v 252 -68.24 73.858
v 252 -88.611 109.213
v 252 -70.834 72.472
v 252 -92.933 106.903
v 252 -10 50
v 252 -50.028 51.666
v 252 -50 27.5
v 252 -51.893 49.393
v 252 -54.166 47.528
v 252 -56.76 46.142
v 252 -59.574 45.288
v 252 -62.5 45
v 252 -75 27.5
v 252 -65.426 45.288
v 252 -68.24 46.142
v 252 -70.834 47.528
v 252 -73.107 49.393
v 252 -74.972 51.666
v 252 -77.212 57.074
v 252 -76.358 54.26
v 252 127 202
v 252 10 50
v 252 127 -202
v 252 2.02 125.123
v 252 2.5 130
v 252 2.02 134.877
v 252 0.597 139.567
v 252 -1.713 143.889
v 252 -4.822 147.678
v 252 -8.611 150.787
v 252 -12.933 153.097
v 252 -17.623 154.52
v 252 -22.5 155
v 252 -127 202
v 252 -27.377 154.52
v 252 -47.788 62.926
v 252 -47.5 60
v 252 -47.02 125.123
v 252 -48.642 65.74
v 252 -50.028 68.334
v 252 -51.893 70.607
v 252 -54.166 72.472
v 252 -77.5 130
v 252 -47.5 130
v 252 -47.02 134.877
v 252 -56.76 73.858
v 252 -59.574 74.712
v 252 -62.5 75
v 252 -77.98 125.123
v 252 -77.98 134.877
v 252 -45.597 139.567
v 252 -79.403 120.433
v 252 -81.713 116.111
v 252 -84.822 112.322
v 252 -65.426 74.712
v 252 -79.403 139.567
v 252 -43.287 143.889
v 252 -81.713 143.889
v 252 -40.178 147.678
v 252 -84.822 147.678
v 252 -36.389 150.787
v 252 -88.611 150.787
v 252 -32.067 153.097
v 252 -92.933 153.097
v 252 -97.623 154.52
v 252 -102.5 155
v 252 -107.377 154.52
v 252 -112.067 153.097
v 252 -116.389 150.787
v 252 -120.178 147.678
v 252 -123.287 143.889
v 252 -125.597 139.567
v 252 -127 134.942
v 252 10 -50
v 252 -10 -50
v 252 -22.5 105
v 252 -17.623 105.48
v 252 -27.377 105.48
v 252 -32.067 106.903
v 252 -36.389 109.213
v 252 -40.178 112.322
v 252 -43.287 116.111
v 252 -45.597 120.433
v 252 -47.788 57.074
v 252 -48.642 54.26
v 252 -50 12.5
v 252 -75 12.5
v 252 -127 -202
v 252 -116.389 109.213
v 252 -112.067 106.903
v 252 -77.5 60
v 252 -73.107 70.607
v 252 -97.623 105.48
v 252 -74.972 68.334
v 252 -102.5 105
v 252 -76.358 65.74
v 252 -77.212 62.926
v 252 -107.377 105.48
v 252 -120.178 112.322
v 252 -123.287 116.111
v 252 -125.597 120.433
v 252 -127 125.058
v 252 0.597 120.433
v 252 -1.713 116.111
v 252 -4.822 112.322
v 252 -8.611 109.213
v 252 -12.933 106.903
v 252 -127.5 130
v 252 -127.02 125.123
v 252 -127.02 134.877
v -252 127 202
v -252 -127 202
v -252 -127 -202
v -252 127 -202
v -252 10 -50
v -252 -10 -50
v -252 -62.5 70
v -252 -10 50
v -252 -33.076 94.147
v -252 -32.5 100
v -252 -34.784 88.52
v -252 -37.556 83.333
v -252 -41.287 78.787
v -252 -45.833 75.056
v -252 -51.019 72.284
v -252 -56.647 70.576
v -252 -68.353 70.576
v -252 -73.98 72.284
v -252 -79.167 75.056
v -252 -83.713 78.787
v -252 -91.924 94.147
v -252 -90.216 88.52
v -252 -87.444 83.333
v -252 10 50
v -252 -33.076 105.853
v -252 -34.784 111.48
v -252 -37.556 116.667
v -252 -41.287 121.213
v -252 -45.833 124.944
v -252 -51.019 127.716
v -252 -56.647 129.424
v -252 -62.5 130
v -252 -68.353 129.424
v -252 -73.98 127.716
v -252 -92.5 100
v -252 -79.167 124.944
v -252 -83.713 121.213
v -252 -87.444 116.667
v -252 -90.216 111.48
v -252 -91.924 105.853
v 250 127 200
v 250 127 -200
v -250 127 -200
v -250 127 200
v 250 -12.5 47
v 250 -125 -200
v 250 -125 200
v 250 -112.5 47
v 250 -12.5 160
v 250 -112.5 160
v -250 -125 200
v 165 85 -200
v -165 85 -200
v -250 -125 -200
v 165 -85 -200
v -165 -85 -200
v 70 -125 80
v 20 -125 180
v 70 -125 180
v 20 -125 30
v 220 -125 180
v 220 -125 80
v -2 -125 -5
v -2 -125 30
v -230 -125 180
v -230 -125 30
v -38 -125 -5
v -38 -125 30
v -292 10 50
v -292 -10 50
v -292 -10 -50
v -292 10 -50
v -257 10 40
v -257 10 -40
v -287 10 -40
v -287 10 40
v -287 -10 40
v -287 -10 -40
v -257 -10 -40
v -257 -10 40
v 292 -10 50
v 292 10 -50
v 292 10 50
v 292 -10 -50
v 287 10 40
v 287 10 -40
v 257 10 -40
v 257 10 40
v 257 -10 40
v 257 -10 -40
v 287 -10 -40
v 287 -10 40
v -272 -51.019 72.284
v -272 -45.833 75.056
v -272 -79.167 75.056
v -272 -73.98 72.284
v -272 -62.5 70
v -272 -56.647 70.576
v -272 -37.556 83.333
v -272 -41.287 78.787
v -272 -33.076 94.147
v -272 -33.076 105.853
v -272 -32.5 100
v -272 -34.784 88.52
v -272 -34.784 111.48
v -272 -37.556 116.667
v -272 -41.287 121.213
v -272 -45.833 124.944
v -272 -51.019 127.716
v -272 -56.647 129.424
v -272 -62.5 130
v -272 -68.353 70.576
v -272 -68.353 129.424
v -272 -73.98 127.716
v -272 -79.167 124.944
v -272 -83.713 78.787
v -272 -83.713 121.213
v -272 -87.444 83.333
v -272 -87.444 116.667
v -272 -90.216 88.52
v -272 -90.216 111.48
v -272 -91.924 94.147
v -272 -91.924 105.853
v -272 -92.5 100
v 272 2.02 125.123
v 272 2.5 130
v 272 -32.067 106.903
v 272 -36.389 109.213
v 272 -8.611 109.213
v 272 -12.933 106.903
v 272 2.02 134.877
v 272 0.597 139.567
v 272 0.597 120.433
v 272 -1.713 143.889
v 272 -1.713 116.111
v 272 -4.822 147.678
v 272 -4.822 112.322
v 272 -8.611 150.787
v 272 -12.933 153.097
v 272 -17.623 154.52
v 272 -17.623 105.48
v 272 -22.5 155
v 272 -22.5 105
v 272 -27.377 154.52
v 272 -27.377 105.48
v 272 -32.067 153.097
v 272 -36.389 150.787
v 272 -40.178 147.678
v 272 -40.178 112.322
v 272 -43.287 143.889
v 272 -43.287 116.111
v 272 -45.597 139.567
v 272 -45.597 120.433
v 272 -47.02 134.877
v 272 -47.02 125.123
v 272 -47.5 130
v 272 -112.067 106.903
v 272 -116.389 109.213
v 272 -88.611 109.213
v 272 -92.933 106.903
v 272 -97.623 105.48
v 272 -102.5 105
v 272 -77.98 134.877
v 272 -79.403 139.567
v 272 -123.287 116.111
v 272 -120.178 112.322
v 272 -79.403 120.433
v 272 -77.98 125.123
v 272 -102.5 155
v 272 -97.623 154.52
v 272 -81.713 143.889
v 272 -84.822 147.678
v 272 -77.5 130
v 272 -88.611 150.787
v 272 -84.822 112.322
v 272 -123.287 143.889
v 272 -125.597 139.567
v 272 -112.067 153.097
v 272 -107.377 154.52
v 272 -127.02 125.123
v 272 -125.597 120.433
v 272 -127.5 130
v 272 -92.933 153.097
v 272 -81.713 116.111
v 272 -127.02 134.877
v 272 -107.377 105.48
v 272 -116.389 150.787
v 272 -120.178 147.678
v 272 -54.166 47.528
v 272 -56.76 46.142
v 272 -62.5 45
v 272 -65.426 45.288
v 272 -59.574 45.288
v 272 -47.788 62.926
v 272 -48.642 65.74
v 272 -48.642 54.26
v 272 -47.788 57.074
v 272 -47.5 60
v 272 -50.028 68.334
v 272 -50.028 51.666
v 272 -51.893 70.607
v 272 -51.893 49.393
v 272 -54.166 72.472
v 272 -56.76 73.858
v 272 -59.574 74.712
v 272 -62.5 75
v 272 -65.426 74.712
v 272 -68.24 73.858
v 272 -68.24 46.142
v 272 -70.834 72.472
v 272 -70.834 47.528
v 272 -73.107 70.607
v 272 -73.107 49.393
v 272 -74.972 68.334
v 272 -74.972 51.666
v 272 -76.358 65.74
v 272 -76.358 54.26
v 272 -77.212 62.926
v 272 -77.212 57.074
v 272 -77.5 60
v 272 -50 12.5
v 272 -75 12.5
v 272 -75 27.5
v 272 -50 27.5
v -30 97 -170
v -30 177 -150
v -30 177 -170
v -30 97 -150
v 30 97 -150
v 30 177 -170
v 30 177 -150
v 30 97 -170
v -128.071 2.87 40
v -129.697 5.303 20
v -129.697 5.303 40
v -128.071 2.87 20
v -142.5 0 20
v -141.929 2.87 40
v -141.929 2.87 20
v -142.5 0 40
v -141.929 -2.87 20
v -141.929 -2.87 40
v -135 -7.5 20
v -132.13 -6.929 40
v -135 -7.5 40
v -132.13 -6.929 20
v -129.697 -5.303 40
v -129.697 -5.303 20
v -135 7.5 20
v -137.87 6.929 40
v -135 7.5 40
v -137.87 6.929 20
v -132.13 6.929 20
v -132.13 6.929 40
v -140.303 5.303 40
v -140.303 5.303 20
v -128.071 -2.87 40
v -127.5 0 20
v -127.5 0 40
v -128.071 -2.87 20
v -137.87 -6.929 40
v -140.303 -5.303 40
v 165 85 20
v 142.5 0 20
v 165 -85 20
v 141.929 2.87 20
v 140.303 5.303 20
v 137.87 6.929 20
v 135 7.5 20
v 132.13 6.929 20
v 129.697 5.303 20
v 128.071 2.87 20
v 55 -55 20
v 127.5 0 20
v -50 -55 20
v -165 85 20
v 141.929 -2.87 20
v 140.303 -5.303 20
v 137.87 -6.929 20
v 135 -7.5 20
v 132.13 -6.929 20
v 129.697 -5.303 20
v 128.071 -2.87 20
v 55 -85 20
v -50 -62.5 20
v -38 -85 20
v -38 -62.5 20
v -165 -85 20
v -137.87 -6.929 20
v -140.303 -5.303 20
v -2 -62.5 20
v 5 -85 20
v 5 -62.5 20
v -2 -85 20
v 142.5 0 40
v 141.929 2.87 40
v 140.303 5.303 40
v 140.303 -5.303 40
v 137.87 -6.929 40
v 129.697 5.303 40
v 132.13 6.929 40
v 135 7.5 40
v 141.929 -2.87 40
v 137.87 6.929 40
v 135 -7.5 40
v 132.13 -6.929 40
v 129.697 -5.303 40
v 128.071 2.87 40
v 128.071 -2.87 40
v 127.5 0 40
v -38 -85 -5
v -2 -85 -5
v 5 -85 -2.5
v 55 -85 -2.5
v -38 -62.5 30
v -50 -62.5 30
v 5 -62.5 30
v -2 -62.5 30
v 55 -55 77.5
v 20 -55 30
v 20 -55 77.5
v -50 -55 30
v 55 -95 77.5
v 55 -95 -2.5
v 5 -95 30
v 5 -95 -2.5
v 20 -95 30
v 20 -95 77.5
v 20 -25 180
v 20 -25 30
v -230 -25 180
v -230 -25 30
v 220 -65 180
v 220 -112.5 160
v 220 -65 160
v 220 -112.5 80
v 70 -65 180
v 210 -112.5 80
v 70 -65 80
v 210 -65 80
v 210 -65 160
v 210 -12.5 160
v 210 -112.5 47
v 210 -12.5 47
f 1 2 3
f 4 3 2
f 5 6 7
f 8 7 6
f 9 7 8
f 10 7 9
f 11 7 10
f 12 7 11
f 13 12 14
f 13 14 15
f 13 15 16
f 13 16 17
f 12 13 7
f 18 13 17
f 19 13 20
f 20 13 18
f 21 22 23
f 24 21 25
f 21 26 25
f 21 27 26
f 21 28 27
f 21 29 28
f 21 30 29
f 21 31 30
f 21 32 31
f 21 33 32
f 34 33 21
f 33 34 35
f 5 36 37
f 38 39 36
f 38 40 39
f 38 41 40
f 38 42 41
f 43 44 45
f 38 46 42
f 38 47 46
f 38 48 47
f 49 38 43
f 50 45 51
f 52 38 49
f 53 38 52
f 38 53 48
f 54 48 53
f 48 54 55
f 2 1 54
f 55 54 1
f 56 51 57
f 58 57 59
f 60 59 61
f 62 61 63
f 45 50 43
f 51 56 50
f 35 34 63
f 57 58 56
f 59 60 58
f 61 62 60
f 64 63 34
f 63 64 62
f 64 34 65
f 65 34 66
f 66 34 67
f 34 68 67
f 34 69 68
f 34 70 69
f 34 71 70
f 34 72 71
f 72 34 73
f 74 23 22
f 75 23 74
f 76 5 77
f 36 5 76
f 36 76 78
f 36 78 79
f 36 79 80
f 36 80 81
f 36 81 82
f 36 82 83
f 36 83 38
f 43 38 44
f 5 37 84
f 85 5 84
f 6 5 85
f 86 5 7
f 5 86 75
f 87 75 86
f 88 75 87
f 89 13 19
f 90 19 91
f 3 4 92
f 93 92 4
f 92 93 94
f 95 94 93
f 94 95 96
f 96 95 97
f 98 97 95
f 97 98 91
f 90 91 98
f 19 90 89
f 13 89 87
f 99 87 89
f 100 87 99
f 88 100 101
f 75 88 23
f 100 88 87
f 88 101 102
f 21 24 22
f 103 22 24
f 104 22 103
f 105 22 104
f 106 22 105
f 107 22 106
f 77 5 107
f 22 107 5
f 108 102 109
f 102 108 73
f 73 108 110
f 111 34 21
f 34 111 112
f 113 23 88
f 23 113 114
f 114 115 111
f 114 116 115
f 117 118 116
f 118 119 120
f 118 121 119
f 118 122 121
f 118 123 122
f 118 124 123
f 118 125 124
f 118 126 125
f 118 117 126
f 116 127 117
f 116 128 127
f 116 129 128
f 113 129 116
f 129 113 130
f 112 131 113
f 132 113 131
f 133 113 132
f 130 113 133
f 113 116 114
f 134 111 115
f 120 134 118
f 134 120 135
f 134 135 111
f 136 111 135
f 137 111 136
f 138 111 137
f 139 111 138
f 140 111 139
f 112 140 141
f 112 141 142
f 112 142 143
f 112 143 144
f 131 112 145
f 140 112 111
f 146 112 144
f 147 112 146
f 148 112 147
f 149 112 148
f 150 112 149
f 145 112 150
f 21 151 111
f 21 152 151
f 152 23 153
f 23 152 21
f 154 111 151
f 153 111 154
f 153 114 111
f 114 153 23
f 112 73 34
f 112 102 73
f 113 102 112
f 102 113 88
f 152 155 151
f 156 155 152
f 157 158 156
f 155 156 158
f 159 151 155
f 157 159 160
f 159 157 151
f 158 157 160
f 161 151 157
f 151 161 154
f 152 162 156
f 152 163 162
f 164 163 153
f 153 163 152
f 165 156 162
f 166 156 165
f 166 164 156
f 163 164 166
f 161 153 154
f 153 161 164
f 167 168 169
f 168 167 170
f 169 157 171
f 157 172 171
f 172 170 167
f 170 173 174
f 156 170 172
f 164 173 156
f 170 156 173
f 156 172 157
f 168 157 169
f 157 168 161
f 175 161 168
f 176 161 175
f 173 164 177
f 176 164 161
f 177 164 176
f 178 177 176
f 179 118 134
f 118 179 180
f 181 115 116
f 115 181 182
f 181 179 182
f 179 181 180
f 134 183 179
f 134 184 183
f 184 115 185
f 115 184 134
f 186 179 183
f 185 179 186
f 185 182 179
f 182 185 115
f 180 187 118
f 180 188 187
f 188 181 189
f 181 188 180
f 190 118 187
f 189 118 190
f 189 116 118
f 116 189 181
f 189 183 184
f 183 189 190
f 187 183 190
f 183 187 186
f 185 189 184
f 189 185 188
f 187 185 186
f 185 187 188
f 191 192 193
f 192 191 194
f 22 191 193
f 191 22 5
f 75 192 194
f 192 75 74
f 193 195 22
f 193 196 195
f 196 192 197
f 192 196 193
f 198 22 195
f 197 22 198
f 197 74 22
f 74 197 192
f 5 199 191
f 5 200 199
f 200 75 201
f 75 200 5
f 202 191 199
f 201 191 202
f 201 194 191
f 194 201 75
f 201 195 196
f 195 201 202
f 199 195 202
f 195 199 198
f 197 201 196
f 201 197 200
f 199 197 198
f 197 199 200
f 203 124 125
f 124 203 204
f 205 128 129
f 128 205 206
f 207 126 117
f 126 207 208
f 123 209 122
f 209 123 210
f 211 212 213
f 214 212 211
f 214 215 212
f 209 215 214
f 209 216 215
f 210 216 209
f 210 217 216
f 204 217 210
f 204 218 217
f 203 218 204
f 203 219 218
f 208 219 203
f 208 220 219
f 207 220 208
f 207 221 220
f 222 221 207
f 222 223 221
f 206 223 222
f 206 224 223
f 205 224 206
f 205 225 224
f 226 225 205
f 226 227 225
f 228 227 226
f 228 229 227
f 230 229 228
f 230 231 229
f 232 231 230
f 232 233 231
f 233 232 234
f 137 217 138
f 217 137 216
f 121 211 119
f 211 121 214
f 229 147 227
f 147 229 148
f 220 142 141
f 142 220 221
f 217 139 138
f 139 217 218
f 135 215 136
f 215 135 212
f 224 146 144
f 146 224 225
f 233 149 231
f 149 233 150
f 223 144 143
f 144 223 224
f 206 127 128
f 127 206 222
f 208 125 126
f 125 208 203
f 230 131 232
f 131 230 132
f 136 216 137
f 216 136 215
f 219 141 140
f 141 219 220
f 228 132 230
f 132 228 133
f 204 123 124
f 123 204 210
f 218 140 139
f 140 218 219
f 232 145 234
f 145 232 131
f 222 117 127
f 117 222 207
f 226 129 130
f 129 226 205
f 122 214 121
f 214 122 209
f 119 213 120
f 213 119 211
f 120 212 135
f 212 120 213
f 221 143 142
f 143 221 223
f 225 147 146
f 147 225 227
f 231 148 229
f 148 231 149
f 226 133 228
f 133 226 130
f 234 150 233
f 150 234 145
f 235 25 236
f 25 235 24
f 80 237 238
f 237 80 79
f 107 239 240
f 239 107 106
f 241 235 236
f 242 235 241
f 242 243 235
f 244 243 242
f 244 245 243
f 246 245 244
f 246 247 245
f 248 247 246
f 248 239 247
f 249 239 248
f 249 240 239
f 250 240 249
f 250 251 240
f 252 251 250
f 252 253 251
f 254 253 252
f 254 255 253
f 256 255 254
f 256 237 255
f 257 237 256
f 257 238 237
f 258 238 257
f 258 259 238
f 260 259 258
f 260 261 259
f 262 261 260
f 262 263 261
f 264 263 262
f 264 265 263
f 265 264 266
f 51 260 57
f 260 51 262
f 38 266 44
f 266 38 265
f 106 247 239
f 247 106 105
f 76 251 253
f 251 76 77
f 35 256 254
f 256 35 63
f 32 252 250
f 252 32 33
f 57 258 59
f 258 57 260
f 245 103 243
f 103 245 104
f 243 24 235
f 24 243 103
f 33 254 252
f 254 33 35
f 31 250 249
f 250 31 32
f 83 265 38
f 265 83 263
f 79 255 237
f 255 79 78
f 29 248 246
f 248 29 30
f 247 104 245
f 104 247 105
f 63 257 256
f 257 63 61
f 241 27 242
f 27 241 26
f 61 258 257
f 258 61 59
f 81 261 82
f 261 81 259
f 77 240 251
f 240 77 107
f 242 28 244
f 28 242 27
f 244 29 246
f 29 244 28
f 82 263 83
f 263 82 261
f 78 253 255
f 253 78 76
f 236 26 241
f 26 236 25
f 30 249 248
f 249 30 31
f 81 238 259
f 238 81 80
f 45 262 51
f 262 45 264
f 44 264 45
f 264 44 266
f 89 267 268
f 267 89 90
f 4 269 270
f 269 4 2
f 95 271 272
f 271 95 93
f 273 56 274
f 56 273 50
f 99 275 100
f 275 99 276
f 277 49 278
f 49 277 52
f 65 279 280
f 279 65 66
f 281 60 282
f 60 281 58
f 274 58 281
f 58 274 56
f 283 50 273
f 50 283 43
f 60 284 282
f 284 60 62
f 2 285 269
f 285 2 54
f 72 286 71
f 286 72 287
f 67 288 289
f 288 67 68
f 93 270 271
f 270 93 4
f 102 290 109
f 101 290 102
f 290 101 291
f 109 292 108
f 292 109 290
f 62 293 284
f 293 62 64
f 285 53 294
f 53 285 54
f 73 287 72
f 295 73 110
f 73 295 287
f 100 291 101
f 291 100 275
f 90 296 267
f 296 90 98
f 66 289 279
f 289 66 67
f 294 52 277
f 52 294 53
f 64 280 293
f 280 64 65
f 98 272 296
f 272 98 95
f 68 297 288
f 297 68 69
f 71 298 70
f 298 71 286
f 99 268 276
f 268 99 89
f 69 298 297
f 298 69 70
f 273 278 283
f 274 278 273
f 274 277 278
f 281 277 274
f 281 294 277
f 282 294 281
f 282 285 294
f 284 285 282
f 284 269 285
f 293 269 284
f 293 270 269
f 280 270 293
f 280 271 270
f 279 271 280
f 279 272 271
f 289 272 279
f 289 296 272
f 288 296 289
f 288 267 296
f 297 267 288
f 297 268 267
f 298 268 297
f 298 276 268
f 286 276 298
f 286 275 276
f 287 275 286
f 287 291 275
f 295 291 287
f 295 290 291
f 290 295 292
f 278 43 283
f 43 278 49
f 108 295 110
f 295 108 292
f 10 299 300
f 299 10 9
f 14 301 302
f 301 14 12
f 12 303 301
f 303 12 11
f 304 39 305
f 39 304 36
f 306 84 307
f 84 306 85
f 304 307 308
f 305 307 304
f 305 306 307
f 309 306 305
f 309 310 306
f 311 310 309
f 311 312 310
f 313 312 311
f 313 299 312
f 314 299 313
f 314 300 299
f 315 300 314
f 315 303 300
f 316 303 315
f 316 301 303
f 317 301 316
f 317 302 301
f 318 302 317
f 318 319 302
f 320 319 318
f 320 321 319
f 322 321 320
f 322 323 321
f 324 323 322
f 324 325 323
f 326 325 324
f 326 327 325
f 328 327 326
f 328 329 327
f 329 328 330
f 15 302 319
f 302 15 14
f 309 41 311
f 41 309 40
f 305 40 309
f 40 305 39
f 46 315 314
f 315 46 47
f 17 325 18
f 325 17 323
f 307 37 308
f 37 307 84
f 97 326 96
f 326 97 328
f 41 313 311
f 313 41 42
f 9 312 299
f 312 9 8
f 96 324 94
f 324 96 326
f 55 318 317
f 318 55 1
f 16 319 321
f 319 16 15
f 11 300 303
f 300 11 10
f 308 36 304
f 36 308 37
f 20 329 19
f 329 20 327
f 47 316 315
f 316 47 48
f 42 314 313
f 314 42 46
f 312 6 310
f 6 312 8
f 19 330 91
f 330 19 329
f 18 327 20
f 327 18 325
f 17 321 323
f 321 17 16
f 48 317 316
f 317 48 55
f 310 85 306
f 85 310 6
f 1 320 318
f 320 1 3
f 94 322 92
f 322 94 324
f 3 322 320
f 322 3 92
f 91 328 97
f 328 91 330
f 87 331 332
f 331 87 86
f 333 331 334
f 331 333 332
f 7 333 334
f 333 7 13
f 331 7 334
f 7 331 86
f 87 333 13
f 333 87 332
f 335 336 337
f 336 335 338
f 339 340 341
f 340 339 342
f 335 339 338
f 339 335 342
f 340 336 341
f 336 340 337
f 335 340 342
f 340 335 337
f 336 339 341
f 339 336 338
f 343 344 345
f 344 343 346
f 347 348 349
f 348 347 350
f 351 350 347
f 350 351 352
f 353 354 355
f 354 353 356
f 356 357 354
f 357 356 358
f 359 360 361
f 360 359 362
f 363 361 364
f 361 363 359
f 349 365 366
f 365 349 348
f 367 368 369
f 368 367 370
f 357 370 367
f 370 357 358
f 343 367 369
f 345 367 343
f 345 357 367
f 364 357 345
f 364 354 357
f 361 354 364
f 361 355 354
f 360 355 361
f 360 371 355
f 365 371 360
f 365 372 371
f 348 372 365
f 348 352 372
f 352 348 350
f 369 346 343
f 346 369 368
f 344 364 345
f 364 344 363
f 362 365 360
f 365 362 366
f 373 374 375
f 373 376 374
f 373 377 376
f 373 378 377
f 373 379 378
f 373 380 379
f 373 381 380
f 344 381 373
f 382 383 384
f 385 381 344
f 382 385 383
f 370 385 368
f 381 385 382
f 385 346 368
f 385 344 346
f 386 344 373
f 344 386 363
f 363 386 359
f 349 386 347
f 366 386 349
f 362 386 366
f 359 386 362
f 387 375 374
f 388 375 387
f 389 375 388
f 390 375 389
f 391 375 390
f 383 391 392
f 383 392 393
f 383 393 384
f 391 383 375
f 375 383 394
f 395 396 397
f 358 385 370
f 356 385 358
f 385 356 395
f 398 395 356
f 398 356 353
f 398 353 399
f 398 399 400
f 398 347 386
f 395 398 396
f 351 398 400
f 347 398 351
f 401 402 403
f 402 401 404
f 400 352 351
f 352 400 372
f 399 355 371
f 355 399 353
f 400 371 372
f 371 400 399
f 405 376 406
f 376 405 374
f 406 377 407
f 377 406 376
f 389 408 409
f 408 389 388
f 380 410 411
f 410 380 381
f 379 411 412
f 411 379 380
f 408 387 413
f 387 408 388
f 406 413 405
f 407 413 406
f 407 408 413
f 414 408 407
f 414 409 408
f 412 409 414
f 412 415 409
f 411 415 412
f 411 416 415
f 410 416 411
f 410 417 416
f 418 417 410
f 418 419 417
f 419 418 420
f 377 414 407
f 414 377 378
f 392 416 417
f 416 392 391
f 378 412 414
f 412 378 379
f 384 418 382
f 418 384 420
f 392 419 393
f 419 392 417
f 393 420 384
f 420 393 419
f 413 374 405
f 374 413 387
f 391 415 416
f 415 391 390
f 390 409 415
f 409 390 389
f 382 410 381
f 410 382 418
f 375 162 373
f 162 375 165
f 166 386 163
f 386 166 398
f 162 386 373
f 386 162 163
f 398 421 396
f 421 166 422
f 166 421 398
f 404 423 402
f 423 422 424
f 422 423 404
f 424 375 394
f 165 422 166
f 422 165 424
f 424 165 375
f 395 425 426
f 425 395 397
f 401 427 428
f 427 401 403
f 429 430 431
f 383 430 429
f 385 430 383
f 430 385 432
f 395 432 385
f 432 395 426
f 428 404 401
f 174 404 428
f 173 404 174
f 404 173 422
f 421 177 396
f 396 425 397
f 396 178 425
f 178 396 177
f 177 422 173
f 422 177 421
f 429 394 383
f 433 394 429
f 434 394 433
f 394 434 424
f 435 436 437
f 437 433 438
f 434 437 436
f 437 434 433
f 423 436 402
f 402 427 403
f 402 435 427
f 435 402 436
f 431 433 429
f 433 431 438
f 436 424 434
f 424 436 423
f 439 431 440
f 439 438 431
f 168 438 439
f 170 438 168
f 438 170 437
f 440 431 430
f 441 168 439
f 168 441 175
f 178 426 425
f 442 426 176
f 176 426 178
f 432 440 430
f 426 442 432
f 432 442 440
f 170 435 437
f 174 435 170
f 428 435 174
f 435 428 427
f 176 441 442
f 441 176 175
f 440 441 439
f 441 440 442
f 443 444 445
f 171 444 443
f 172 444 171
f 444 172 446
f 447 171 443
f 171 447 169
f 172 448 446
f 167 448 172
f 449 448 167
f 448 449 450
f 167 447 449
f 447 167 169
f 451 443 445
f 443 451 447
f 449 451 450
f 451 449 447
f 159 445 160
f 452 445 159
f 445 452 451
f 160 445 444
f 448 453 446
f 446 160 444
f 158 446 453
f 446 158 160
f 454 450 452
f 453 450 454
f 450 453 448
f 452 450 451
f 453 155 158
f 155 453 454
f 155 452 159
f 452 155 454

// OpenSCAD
// Battery Compartment Layout

// --- Parameters ---
// Box dimensions (Internal)
box_w = 500;
box_h = 400;
box_d = 250;
box_thickness = 2;

// Battery dimensions (e.g., typical 12V 100Ah LiFePO4)
batt_w = 330;
batt_d = 170;
batt_h = 220;

// Inverter dimensions (e.g., 1000W)
inv_w = 250;
inv_h = 150;
inv_d = 100;

// Charger dimensions (e.g., 15A AC-DC)
charger_w = 150;
charger_h = 100;
charger_d = 60;

// MPPT Solar Controller dimensions (e.g., Victron SmartSolar 75/15)
mppt_w = 100;
mppt_h = 113;
mppt_d = 40;

// Safety components dimensions
din_rail_w = 100;
din_rail_h = 35;
din_rail_d = 7.5;
rcbo_w = 36; // 2-module wide RCBO
rcbo_h = 85;
rcbo_d = 70;
dc_breaker_w = 50;
dc_breaker_h = 80;
dc_breaker_d = 40;

// --- Modules ---

module enclosure() {
    // Metal electrical box
    difference() {
        // Outer dimensions
        color("SlateGray", 0.3)
        cube([box_w + box_thickness*2, box_d + box_thickness*2, box_h + box_thickness*2], center=true);
        
        // Inner dimensions (hollow out)
        cube([box_w, box_d, box_h], center=true);
        
        // Front door opening
        translate([0, box_d/2, 0])
        cube([box_w, box_thickness*3, box_h], center=true);
    }
}

module handles() {
    // Simple side handles for portability
    handle_w = 20;
    handle_h = 100;
    handle_d = 40;
    
    color("Silver") {
        // Left handle
        translate([-(box_w/2 + handle_d/2 + box_thickness), 0, 0])
        difference() {
            cube([handle_d, handle_w, handle_h], center=true);
            cube([handle_d - 10, handle_w + 2, handle_h - 20], center=true);
        }
        
        // Right handle
        translate([(box_w/2 + handle_d/2 + box_thickness), 0, 0])
        difference() {
            cube([handle_d, handle_w, handle_h], center=true);
            cube([handle_d - 10, handle_w + 2, handle_h - 20], center=true);
        }
    }
}

module external_connectors() {
    // 230V CEE Inlet (Blue, 3-pin)
    color("Blue")
    translate([-(box_w/2 + box_thickness + 10), -box_d/4, box_h/4])
    rotate([0, 90, 0])
    cylinder(d=60, h=20, $fn=32, center=true);
    
    // 2x 230V Outlets (Schuko/Waterproof)
    color("LightGray")
    translate([box_w/2 + box_thickness + 10, -box_d/4 + 40, box_h/4 + 30])
    rotate([0, 90, 0])
    cylinder(d=50, h=20, $fn=32, center=true);
    
    color("LightGray")
    translate([box_w/2 + box_thickness + 10, -box_d/4 - 40, box_h/4 + 30])
    rotate([0, 90, 0])
    cylinder(d=50, h=20, $fn=32, center=true);
    
    // 1x 12V Outlet (Cigarette lighter style or similar)
    color("Black")
    translate([box_w/2 + box_thickness + 10, -box_d/4, box_h/4 - 40])
    rotate([0, 90, 0])
    cylinder(d=30, h=20, $fn=32, center=true);
    
    // Solar Input Connector (XT60 or small Anderson)
    color("Yellow")
    translate([box_w/2 + box_thickness + 10, -box_d/4, box_h/4 - 80])
    rotate([0, 90, 0])
    cube([15, 25, 20], center=true);
    
    // Main DC Connector to Trailer (Anderson style SB175)
    color("Red")
    translate([0, box_d/2 + box_thickness + 10, -box_h/2 + 40])
    rotate([90, 0, 0])
    cube([60, 20, 80], center=true);
}

module battery() {
    // LiFePO4 Battery
    color("DarkSlateGray")
    cube([batt_w, batt_d, batt_h], center=true);
    
    // Terminals
    color("Silver") {
        translate([-batt_w/2 + 30, 0, batt_h/2 + 10]) cylinder(d=15, h=20, $fn=16, center=true);
        translate([batt_w/2 - 30, 0, batt_h/2 + 10]) cylinder(d=15, h=20, $fn=16, center=true);
    }
}

module inverter() {
    color("DodgerBlue")
    cube([inv_w, inv_d, inv_h], center=true);
}

module charger() {
    color("LimeGreen")
    cube([charger_w, charger_d, charger_h], center=true);
}

module mppt() {
    color("DarkTurquoise")
    cube([mppt_w, mppt_d, mppt_h], center=true);
}

module safety_components() {
    // DIN Rail
    color("Silver")
    translate([0, 0, -rcbo_d/2 + din_rail_d/2])
    cube([din_rail_w, din_rail_h, din_rail_d], center=true);
    
    // 230V RCBO (Ground Fault + MCB)
    color("White")
    translate([-20, 0, 0])
    cube([rcbo_w, rcbo_h, rcbo_d], center=true);
    
    // 12V DC Resettable Breaker
    color("Black")
    translate([30, 0, -rcbo_d/2 + dc_breaker_d/2])
    cube([dc_breaker_w, dc_breaker_h, dc_breaker_d], center=true);
}

// --- Main Assembly ---
// Wrapped in a module so main_assembly.scad can place the whole box.
// Origin = center of the enclosure.
module battery_box() {
    enclosure();
    handles();
    external_connectors();

    // Place Battery at the bottom
    translate([0, 0, -box_h/2 + batt_h/2])
    battery();

    // Place Inverter on the back wall, above battery
    translate([-box_w/4 + 20, -box_d/2 + inv_d/2, box_h/2 - inv_h/2 - 20])
    inverter();

    // Place Charger on the back wall, above battery, next to inverter
    translate([box_w/4 + 20, -box_d/2 + charger_d/2, box_h/2 - charger_h/2 - 20])
    charger();

    // Place MPPT Solar Controller on a side wall
    translate([box_w/2 - mppt_d/2, -box_d/4, box_h/2 - mppt_h/2 - 40])
    rotate([0, 0, 90])
    mppt();

    // Place Safety Components (Breakers) near the top or on a side wall
    translate([0, -box_d/2 + rcbo_d/2, box_h/2 - rcbo_h/2 - 120])
    rotate([90, 0, 0])
    safety_components();
}

// Renders if the file is opened standalone
battery_box();
